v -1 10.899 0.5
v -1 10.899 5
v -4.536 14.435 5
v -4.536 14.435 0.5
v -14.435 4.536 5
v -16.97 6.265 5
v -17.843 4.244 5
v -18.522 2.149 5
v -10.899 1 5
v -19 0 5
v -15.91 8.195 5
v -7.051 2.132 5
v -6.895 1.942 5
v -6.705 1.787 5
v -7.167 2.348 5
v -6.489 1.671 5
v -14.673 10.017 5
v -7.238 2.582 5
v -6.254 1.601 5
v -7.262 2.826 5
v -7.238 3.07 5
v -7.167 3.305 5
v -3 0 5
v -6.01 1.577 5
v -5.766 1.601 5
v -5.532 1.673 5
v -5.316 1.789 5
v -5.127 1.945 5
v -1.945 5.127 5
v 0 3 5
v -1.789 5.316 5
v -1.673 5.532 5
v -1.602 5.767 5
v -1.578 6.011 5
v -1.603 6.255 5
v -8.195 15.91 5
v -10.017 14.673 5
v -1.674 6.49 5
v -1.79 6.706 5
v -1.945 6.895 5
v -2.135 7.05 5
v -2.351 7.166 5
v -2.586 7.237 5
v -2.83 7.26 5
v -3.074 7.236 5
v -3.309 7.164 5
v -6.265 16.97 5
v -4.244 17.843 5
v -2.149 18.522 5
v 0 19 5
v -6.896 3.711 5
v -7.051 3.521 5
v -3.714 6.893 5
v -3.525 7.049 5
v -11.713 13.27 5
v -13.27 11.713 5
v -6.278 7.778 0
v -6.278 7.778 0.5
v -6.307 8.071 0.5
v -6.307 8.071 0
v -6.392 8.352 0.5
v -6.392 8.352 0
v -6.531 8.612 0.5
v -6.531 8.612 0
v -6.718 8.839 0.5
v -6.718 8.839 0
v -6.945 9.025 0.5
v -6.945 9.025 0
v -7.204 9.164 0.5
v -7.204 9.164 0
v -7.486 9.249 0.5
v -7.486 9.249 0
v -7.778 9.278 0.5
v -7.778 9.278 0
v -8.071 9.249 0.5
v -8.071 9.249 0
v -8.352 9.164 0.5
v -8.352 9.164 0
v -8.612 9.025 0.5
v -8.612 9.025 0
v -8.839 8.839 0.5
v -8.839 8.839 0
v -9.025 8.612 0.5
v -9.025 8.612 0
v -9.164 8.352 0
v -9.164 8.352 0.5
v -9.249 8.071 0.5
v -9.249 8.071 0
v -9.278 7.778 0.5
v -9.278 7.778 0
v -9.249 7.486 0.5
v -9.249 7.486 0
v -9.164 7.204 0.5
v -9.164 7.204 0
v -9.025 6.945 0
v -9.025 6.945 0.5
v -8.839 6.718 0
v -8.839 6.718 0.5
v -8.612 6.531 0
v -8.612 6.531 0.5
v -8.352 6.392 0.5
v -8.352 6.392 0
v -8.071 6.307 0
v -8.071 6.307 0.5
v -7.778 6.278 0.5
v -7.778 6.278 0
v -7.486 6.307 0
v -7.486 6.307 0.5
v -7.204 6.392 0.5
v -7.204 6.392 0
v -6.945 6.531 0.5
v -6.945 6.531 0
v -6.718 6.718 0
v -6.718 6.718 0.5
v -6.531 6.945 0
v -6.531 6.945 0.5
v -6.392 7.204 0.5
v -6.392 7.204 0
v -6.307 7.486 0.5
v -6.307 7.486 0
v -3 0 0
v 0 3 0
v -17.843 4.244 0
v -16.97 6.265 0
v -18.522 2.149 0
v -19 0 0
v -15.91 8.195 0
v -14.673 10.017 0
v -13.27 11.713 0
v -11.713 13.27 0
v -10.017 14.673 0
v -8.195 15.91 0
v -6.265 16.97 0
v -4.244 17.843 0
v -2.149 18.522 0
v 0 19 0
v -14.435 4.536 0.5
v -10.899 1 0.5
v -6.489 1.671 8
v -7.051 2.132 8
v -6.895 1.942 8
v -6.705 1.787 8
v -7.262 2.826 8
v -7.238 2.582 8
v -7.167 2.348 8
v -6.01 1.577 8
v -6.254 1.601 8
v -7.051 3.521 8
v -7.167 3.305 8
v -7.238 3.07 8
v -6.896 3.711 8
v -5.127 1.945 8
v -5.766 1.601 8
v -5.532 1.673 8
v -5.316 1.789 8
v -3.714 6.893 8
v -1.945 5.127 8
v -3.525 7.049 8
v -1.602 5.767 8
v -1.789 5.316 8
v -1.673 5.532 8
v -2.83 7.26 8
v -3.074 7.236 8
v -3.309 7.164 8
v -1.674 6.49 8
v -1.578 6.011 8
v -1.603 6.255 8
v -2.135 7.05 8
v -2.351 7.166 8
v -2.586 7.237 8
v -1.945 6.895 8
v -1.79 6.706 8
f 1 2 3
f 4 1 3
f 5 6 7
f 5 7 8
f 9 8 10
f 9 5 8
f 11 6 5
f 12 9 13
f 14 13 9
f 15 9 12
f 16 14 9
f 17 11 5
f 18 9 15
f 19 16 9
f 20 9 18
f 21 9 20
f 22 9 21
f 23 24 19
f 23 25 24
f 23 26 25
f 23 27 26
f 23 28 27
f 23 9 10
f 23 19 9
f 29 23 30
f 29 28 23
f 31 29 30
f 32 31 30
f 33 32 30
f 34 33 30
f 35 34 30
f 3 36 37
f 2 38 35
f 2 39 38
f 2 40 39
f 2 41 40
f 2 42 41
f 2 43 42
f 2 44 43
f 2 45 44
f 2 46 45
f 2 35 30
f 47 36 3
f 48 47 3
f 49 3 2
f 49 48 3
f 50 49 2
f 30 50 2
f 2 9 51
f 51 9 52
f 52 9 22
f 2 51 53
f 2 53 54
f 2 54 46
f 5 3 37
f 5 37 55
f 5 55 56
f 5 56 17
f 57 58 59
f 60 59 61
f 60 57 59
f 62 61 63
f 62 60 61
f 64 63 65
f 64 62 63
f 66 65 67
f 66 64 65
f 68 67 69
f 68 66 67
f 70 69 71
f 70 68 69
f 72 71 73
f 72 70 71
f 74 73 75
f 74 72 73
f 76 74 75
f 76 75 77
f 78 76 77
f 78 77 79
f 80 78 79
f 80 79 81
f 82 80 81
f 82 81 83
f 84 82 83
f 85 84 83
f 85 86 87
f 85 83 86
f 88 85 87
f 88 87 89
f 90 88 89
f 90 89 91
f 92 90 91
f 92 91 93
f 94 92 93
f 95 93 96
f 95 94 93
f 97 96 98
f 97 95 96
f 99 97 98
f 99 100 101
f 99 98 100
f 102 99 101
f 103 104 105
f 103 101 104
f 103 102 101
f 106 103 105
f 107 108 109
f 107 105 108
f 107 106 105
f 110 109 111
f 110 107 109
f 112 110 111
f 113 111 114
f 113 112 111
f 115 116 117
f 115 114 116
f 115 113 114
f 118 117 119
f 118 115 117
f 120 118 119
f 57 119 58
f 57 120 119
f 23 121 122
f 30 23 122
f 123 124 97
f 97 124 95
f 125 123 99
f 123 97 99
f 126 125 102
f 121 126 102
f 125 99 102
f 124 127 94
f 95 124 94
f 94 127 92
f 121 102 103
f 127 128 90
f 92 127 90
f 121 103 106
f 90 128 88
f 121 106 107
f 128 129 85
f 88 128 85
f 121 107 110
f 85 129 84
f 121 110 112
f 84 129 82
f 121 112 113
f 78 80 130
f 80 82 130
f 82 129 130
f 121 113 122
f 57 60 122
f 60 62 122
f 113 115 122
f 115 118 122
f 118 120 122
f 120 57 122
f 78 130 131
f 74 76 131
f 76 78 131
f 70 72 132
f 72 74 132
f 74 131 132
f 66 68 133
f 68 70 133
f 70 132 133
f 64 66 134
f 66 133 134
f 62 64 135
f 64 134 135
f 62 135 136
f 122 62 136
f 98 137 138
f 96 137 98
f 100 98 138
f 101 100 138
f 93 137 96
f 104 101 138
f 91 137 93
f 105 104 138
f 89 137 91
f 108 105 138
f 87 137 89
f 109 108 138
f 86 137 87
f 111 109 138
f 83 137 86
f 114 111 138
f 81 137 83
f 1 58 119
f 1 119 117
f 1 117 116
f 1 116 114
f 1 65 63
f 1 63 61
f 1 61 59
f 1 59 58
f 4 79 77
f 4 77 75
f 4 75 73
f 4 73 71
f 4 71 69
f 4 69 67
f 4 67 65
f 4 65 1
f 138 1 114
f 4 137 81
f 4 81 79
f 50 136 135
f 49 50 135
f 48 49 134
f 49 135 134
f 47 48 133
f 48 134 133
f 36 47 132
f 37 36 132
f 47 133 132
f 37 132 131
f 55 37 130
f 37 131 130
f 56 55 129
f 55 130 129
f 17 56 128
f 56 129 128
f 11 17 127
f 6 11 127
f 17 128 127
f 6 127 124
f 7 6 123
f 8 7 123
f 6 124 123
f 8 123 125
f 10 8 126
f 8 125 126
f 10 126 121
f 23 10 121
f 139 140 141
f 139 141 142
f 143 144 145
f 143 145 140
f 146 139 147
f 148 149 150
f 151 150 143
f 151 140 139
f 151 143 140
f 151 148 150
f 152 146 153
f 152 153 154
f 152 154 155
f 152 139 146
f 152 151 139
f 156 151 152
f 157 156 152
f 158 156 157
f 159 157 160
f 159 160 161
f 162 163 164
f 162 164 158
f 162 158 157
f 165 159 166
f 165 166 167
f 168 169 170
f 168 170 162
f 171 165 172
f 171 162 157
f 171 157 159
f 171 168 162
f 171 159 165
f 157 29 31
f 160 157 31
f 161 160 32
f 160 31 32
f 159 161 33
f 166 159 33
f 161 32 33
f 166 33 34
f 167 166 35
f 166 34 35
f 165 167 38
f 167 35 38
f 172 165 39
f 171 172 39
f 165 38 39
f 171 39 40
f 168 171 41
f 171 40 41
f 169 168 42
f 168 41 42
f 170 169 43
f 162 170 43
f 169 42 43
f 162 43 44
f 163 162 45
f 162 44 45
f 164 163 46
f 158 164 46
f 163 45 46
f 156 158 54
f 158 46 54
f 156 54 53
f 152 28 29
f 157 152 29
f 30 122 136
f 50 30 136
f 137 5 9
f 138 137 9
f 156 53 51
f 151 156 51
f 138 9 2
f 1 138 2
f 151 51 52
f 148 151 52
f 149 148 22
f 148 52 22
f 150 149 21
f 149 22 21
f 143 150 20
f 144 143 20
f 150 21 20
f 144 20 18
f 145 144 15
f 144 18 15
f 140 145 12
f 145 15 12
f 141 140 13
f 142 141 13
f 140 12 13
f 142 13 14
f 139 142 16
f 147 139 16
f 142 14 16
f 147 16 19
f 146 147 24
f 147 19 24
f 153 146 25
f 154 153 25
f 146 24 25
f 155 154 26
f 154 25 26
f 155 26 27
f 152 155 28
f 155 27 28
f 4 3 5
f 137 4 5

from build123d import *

# Parameters (mm, degrees)
F1_DEPTH = 5
F3_DEPTH = 4.5
F5_DEPTH = 3
F6_R     = 1.5
F7_DEPTH = 8.001


with BuildPart() as f1:
    # F0 (on Top) → F1 (new body)
    with BuildSketch(Plane.XY):
        with BuildLine():
            Line((-3, 0), (0, 3))
            Line((0, 3), (0, 19))
            ThreePointArc((0, 19), (-12.510187, 12.510187), (-19, 0))
            Line((-19, 0), (-3, 0))
        make_face()
    extrude(amount=F1_DEPTH)

    # F2 (on face) → F3 (cut)
    with BuildSketch(Plane.XY.offset(5)):
        Polygon((-10.899495, 1), (-1, 10.899495), (-4.535534, 14.435029), (-14.435029, 4.535534), align=None)
    extrude(amount=-F3_DEPTH, mode=Mode.SUBTRACT)

    # F4 (on face) → F5 (join)
    with BuildSketch(Plane.XY.offset(5)):
        with BuildLine():
            Line((-3.713925, 6.892677), (-6.895905, 3.710697))
            ThreePointArc((-6.895905, 3.710697), (-6.895098, 1.942122), (-5.126524, 1.944544))
            Line((-5.126524, 1.944544), (-1.944544, 5.126524))
            ThreePointArc((-1.944544, 5.126524), (-1.945351, 6.895099), (-3.713925, 6.892677))
        make_face()
    extrude(amount=F5_DEPTH)

    # F6 (on face) → F7 (cut, through all)
    with BuildSketch(Plane.XY):
        with Locations((-7.778175, 7.778175)):
            Circle(F6_R)
    extrude(amount=F7_DEPTH, mode=Mode.SUBTRACT)


solid = f1.part
